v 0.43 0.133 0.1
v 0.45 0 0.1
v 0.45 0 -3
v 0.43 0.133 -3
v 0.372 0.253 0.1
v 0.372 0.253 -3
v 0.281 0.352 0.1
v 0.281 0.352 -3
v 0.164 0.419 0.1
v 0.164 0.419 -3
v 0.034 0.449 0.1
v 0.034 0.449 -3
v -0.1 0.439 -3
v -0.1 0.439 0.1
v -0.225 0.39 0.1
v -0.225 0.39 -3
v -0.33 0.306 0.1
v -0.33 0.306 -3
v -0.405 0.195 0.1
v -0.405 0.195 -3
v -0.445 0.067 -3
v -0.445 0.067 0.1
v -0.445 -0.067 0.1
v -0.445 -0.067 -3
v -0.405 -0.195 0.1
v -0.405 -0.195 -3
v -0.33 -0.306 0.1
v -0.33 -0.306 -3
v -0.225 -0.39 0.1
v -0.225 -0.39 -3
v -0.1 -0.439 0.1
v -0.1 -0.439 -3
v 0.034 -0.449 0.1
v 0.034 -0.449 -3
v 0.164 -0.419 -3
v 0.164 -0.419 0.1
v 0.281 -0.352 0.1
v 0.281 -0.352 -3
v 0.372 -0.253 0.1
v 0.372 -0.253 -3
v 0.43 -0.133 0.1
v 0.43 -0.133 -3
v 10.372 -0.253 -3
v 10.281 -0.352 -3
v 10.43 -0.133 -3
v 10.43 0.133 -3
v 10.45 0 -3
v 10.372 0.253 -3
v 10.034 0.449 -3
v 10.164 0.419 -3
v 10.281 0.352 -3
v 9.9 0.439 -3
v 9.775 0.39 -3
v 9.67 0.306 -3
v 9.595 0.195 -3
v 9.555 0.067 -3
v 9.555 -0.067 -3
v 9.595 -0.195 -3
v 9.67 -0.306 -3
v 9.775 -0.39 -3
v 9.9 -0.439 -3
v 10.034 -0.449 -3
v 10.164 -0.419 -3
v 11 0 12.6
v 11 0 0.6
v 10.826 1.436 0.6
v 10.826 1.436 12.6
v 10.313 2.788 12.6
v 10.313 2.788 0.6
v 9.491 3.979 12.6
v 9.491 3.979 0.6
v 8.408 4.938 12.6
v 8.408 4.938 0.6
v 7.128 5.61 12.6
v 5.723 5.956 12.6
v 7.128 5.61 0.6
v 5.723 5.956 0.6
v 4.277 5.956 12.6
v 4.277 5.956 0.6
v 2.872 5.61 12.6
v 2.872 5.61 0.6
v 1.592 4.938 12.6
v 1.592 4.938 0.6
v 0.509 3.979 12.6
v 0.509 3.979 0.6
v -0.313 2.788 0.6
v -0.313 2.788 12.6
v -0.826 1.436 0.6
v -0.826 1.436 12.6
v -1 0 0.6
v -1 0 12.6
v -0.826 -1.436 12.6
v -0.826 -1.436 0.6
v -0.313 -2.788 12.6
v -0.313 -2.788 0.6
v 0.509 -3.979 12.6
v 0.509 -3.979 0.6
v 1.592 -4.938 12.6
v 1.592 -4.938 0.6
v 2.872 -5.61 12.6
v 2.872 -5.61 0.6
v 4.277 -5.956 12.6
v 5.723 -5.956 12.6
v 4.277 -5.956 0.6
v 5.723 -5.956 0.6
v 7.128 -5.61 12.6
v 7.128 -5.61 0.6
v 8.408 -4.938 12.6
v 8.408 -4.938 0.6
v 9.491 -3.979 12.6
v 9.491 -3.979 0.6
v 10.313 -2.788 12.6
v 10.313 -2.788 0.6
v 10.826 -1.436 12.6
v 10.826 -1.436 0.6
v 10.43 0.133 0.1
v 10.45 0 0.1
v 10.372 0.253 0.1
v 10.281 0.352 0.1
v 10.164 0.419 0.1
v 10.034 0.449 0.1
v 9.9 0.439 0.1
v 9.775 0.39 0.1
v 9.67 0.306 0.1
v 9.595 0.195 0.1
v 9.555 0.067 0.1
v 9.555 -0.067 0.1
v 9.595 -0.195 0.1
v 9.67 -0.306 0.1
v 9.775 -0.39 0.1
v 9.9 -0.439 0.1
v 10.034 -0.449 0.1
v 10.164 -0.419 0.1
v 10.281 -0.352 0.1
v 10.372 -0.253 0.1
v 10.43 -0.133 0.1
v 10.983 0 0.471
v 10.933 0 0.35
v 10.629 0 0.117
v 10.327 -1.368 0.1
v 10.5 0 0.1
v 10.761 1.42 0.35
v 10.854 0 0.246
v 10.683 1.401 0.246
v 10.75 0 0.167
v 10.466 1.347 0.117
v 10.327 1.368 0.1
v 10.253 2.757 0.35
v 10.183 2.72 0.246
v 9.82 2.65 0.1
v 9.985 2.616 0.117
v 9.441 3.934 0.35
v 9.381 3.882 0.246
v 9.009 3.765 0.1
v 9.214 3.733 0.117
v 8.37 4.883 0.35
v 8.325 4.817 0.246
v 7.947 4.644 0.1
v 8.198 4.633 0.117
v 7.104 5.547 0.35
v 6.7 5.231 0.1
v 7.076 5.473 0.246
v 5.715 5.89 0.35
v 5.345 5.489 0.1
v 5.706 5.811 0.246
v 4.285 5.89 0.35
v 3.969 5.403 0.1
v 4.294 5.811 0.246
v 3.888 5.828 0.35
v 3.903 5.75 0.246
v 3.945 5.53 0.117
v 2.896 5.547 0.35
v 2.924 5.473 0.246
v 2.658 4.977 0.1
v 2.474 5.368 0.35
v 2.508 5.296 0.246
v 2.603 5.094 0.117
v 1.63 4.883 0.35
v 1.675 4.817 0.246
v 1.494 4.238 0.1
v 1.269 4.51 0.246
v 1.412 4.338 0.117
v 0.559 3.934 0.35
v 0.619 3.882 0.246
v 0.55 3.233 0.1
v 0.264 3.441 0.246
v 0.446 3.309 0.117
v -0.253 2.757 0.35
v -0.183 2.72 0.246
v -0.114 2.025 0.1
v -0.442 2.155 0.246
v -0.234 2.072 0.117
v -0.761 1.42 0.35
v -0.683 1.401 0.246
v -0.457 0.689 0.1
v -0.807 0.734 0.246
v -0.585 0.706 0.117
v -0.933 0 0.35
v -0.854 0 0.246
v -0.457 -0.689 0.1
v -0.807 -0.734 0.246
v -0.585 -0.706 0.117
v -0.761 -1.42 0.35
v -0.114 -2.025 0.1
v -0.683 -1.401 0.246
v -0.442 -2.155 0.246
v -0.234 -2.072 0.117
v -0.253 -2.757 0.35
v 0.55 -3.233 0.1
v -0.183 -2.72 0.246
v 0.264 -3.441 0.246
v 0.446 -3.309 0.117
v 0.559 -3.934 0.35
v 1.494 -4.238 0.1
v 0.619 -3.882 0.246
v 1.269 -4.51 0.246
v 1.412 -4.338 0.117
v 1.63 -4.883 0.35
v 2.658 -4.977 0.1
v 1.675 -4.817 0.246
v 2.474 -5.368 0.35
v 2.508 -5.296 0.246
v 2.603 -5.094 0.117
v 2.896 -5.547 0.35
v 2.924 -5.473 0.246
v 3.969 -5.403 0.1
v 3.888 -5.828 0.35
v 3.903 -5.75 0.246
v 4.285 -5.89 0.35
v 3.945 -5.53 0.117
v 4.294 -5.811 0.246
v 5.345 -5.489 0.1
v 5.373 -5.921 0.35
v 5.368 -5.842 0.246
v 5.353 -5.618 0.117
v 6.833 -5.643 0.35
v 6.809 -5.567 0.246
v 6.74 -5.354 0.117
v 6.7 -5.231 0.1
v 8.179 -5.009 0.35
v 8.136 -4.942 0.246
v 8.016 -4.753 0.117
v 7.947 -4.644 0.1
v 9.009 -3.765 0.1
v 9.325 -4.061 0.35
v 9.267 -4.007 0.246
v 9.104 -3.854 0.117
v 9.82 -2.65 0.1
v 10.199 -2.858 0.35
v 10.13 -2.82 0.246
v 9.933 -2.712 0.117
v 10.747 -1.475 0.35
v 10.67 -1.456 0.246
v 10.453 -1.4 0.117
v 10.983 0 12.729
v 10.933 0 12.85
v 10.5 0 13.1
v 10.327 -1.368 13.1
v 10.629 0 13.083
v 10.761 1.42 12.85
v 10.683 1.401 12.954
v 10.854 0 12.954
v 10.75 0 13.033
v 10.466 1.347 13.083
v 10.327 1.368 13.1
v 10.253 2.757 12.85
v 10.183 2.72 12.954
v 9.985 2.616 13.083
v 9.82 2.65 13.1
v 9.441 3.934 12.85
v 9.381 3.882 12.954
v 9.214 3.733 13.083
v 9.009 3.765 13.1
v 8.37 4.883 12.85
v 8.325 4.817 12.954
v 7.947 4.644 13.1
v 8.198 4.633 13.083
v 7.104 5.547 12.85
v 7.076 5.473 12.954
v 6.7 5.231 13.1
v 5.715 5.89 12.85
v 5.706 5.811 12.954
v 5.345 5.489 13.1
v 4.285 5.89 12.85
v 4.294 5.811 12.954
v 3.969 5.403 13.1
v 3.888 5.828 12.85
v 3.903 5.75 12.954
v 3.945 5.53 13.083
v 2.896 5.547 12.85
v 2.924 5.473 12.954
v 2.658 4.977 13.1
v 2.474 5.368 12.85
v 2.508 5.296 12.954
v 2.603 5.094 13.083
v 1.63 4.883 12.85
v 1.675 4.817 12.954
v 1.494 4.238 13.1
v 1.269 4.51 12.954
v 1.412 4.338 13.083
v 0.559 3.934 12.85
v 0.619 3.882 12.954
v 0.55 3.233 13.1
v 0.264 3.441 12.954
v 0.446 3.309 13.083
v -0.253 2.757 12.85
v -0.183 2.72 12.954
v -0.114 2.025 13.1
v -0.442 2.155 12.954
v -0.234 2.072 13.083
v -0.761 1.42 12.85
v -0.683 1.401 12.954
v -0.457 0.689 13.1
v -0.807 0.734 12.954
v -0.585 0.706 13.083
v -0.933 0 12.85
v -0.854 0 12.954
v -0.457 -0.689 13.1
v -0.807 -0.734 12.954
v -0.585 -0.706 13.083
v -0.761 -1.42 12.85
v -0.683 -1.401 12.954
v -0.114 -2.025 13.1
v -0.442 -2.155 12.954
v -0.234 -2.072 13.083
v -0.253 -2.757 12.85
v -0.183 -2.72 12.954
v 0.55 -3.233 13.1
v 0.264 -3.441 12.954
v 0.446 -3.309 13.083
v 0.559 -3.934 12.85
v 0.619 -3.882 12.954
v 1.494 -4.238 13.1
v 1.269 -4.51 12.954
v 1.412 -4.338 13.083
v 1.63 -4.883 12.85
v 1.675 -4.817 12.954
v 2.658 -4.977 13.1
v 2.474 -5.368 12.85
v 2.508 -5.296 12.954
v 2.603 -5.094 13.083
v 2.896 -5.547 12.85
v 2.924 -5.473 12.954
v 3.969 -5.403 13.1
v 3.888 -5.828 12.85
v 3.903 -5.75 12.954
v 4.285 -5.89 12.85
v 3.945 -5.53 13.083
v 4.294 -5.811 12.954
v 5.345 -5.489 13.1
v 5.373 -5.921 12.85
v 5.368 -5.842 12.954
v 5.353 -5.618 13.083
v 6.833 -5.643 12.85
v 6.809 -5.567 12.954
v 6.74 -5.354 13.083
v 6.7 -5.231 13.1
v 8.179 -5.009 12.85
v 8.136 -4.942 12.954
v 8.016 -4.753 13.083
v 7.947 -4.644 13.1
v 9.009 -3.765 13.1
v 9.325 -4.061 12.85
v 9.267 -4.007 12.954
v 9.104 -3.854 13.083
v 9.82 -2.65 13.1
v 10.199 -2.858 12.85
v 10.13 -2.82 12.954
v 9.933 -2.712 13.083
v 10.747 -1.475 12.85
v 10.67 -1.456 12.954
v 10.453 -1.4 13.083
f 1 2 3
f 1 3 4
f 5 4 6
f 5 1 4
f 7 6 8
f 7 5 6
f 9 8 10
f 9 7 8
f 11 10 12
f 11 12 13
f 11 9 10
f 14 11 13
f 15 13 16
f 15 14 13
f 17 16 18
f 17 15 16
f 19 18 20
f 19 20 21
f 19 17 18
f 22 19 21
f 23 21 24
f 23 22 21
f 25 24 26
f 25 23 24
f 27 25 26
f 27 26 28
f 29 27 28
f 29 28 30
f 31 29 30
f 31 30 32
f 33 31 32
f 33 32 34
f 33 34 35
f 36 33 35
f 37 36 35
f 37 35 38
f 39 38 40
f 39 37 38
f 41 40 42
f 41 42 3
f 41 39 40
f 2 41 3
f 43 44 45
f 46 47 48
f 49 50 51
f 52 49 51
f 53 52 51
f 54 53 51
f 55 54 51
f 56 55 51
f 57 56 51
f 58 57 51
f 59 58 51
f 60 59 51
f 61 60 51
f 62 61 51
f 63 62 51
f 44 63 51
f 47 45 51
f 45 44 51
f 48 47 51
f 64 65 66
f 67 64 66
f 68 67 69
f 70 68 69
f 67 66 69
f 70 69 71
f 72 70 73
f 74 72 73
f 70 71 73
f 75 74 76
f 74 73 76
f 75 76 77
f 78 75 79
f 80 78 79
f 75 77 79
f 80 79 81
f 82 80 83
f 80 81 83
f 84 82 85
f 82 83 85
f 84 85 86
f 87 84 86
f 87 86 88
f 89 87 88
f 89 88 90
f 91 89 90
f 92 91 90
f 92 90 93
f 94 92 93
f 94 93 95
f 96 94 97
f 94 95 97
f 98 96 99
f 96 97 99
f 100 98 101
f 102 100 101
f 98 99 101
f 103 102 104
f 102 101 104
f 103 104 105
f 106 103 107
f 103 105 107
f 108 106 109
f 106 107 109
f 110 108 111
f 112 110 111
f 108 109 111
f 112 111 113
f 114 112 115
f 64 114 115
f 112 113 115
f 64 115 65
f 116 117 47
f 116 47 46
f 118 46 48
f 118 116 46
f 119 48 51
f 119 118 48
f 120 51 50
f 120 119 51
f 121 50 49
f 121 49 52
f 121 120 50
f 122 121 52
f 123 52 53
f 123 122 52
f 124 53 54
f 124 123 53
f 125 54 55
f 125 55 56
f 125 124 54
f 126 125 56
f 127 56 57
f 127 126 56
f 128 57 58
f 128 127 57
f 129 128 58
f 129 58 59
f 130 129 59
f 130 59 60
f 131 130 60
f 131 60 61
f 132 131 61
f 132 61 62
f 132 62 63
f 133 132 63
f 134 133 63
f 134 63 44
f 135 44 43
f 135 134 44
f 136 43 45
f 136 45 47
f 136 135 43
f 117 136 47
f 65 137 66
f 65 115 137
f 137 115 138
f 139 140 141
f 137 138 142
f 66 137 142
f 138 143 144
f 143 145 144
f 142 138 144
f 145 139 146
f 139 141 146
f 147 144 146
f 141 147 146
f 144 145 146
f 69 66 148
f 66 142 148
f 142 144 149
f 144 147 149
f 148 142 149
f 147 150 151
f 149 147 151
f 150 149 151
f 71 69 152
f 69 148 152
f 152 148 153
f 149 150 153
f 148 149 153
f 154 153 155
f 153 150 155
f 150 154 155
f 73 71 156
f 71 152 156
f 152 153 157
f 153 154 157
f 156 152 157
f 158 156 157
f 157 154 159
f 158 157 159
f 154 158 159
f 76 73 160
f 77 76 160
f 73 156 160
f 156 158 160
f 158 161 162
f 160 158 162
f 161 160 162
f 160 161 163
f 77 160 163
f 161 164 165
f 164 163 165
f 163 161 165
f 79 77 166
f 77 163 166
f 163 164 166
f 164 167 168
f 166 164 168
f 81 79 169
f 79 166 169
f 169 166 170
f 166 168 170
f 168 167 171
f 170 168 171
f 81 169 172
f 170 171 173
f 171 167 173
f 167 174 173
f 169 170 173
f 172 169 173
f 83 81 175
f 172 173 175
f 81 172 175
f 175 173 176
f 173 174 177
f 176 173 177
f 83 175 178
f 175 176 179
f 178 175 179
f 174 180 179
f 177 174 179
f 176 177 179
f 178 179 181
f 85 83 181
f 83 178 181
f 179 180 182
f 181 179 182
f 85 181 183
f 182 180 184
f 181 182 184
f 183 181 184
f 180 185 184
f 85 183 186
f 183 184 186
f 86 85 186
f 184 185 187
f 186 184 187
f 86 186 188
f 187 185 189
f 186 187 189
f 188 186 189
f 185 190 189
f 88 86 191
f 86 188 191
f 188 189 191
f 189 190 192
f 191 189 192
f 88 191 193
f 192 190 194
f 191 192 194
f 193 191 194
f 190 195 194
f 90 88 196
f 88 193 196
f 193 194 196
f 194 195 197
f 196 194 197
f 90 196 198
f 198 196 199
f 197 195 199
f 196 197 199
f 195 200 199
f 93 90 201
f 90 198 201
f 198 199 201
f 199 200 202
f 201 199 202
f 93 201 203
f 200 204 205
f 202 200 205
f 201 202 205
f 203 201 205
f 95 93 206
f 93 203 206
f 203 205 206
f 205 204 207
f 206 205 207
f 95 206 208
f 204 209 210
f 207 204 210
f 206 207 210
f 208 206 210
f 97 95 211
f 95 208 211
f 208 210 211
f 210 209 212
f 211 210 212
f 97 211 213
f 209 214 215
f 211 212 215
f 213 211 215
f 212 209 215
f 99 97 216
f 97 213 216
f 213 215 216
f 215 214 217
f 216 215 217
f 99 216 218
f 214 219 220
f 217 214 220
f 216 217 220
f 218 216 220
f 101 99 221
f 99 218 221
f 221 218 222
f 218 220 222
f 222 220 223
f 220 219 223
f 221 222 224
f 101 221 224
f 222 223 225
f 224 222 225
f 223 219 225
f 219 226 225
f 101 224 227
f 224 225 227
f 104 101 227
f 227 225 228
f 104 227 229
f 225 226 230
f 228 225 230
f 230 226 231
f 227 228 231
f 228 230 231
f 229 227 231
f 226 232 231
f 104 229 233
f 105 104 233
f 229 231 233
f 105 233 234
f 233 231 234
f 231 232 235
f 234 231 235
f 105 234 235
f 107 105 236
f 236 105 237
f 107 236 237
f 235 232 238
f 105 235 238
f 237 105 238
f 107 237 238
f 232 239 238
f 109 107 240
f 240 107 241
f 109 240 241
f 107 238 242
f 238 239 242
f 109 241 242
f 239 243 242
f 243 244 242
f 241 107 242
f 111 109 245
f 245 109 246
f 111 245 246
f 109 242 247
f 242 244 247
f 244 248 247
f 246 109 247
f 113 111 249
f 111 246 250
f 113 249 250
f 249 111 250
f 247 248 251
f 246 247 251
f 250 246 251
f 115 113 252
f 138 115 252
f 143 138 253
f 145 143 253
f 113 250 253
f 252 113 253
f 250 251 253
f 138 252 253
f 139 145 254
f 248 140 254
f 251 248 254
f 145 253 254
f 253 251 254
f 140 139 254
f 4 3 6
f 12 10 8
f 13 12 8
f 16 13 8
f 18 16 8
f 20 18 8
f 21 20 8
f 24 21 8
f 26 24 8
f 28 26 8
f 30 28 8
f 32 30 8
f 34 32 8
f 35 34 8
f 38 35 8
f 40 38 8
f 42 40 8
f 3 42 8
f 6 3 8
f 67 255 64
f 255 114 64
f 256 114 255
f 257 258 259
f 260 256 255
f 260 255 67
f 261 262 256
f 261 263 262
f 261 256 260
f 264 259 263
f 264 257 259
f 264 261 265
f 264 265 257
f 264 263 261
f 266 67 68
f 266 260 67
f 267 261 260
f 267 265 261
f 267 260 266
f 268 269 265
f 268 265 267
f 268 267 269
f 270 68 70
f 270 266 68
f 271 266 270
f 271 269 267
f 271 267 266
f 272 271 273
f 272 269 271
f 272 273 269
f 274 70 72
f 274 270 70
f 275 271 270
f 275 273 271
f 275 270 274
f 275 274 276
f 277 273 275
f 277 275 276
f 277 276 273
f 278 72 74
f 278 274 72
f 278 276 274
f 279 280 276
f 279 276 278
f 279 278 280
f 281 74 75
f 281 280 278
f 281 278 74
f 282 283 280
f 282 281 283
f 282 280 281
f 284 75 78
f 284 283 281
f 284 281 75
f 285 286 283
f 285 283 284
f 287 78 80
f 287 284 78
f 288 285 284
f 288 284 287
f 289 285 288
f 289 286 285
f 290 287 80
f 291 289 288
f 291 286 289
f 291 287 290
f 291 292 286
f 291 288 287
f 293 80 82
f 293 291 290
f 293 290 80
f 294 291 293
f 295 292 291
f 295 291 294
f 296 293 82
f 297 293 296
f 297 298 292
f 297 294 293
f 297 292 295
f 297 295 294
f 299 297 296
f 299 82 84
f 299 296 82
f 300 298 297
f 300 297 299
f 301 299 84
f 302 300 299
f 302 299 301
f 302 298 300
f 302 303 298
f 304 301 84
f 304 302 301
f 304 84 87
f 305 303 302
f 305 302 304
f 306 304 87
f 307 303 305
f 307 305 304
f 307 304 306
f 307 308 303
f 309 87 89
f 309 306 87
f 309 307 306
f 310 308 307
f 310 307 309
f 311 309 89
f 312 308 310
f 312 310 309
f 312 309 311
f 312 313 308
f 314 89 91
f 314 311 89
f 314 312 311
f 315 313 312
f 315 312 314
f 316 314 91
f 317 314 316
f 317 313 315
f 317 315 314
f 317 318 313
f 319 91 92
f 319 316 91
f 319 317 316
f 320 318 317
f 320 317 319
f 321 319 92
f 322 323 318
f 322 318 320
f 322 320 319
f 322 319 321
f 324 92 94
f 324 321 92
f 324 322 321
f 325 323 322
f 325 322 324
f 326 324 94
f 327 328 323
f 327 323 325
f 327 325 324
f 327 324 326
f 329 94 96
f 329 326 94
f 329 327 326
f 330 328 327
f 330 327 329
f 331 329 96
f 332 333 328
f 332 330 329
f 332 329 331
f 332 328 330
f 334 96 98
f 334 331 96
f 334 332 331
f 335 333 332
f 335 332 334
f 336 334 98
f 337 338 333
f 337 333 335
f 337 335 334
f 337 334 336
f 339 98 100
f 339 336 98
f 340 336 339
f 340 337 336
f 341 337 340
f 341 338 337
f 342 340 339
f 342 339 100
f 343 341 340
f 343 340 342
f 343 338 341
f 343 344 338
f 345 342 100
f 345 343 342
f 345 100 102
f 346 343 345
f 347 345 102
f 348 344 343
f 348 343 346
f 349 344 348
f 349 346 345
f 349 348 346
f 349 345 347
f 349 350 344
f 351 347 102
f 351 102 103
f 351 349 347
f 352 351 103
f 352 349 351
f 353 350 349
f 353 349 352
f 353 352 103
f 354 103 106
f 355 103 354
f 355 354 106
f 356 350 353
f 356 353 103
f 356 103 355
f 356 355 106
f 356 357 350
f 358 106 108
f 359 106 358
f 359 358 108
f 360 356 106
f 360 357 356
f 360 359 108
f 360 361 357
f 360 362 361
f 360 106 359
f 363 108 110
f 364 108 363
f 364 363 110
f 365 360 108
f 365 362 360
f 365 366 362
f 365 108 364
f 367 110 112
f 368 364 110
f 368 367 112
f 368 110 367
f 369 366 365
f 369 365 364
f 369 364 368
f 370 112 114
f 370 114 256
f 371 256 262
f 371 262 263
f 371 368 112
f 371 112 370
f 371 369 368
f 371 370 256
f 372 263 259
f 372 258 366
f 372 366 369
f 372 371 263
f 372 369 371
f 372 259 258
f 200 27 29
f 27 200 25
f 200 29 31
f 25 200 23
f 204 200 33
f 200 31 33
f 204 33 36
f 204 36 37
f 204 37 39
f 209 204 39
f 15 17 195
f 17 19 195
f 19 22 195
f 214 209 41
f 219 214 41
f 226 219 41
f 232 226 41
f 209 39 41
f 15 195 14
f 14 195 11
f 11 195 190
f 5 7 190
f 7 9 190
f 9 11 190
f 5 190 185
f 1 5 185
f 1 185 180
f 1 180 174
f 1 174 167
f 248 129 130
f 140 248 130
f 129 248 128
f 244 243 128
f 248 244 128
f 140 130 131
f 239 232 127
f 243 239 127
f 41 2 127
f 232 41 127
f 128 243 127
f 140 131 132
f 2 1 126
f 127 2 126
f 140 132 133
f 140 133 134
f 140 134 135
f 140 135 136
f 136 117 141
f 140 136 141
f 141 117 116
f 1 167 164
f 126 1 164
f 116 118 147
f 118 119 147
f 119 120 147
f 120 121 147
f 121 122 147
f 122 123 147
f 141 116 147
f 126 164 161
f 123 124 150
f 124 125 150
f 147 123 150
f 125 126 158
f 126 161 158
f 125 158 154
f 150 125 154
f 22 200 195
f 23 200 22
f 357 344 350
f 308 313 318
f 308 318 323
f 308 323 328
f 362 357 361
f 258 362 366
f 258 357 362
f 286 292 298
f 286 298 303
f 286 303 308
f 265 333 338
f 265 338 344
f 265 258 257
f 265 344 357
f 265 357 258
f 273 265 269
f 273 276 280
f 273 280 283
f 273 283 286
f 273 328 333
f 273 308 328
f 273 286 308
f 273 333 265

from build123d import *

# Parameters (mm, degrees)
SKETCH001_R       = 0.45
PAD001_DEPTH      = 6.5
PAD001_DEPTH_BACK = 3.5
SKETCH_R          = 6
PAD_DEPTH         = 13
FILLET_R          = 0.5


with BuildPart() as pad001:
    # Sketch001 → Pad001 (new body, two sides)
    with BuildSketch(Plane.XY.offset(0.5)) as pad001_sk:
        Circle(SKETCH001_R)
        with Locations((10, 0)):
            Circle(SKETCH001_R)
    extrude(amount=PAD001_DEPTH)
    extrude(pad001_sk.sketch, amount=-PAD001_DEPTH_BACK)


with BuildPart() as fillet_mp_cp:
    # Sketch → Pad (new body)
    with BuildSketch(Plane.XY.offset(0.1)):
        with Locations((5, 0)):
            Circle(SKETCH_R)
    extrude(amount=PAD_DEPTH)

    # Fillet
    fillet_edges = [fillet_mp_cp.edges().sort_by_distance(p)[0] for p in [
        (-1, 0, 0.1),
        (-1, 0, 13.1),
    ]]
    fillet(fillet_edges, radius=FILLET_R)

    # Fillet_mp_cp: union Pad001
    add(pad001.part)


solid = fillet_mp_cp.part
